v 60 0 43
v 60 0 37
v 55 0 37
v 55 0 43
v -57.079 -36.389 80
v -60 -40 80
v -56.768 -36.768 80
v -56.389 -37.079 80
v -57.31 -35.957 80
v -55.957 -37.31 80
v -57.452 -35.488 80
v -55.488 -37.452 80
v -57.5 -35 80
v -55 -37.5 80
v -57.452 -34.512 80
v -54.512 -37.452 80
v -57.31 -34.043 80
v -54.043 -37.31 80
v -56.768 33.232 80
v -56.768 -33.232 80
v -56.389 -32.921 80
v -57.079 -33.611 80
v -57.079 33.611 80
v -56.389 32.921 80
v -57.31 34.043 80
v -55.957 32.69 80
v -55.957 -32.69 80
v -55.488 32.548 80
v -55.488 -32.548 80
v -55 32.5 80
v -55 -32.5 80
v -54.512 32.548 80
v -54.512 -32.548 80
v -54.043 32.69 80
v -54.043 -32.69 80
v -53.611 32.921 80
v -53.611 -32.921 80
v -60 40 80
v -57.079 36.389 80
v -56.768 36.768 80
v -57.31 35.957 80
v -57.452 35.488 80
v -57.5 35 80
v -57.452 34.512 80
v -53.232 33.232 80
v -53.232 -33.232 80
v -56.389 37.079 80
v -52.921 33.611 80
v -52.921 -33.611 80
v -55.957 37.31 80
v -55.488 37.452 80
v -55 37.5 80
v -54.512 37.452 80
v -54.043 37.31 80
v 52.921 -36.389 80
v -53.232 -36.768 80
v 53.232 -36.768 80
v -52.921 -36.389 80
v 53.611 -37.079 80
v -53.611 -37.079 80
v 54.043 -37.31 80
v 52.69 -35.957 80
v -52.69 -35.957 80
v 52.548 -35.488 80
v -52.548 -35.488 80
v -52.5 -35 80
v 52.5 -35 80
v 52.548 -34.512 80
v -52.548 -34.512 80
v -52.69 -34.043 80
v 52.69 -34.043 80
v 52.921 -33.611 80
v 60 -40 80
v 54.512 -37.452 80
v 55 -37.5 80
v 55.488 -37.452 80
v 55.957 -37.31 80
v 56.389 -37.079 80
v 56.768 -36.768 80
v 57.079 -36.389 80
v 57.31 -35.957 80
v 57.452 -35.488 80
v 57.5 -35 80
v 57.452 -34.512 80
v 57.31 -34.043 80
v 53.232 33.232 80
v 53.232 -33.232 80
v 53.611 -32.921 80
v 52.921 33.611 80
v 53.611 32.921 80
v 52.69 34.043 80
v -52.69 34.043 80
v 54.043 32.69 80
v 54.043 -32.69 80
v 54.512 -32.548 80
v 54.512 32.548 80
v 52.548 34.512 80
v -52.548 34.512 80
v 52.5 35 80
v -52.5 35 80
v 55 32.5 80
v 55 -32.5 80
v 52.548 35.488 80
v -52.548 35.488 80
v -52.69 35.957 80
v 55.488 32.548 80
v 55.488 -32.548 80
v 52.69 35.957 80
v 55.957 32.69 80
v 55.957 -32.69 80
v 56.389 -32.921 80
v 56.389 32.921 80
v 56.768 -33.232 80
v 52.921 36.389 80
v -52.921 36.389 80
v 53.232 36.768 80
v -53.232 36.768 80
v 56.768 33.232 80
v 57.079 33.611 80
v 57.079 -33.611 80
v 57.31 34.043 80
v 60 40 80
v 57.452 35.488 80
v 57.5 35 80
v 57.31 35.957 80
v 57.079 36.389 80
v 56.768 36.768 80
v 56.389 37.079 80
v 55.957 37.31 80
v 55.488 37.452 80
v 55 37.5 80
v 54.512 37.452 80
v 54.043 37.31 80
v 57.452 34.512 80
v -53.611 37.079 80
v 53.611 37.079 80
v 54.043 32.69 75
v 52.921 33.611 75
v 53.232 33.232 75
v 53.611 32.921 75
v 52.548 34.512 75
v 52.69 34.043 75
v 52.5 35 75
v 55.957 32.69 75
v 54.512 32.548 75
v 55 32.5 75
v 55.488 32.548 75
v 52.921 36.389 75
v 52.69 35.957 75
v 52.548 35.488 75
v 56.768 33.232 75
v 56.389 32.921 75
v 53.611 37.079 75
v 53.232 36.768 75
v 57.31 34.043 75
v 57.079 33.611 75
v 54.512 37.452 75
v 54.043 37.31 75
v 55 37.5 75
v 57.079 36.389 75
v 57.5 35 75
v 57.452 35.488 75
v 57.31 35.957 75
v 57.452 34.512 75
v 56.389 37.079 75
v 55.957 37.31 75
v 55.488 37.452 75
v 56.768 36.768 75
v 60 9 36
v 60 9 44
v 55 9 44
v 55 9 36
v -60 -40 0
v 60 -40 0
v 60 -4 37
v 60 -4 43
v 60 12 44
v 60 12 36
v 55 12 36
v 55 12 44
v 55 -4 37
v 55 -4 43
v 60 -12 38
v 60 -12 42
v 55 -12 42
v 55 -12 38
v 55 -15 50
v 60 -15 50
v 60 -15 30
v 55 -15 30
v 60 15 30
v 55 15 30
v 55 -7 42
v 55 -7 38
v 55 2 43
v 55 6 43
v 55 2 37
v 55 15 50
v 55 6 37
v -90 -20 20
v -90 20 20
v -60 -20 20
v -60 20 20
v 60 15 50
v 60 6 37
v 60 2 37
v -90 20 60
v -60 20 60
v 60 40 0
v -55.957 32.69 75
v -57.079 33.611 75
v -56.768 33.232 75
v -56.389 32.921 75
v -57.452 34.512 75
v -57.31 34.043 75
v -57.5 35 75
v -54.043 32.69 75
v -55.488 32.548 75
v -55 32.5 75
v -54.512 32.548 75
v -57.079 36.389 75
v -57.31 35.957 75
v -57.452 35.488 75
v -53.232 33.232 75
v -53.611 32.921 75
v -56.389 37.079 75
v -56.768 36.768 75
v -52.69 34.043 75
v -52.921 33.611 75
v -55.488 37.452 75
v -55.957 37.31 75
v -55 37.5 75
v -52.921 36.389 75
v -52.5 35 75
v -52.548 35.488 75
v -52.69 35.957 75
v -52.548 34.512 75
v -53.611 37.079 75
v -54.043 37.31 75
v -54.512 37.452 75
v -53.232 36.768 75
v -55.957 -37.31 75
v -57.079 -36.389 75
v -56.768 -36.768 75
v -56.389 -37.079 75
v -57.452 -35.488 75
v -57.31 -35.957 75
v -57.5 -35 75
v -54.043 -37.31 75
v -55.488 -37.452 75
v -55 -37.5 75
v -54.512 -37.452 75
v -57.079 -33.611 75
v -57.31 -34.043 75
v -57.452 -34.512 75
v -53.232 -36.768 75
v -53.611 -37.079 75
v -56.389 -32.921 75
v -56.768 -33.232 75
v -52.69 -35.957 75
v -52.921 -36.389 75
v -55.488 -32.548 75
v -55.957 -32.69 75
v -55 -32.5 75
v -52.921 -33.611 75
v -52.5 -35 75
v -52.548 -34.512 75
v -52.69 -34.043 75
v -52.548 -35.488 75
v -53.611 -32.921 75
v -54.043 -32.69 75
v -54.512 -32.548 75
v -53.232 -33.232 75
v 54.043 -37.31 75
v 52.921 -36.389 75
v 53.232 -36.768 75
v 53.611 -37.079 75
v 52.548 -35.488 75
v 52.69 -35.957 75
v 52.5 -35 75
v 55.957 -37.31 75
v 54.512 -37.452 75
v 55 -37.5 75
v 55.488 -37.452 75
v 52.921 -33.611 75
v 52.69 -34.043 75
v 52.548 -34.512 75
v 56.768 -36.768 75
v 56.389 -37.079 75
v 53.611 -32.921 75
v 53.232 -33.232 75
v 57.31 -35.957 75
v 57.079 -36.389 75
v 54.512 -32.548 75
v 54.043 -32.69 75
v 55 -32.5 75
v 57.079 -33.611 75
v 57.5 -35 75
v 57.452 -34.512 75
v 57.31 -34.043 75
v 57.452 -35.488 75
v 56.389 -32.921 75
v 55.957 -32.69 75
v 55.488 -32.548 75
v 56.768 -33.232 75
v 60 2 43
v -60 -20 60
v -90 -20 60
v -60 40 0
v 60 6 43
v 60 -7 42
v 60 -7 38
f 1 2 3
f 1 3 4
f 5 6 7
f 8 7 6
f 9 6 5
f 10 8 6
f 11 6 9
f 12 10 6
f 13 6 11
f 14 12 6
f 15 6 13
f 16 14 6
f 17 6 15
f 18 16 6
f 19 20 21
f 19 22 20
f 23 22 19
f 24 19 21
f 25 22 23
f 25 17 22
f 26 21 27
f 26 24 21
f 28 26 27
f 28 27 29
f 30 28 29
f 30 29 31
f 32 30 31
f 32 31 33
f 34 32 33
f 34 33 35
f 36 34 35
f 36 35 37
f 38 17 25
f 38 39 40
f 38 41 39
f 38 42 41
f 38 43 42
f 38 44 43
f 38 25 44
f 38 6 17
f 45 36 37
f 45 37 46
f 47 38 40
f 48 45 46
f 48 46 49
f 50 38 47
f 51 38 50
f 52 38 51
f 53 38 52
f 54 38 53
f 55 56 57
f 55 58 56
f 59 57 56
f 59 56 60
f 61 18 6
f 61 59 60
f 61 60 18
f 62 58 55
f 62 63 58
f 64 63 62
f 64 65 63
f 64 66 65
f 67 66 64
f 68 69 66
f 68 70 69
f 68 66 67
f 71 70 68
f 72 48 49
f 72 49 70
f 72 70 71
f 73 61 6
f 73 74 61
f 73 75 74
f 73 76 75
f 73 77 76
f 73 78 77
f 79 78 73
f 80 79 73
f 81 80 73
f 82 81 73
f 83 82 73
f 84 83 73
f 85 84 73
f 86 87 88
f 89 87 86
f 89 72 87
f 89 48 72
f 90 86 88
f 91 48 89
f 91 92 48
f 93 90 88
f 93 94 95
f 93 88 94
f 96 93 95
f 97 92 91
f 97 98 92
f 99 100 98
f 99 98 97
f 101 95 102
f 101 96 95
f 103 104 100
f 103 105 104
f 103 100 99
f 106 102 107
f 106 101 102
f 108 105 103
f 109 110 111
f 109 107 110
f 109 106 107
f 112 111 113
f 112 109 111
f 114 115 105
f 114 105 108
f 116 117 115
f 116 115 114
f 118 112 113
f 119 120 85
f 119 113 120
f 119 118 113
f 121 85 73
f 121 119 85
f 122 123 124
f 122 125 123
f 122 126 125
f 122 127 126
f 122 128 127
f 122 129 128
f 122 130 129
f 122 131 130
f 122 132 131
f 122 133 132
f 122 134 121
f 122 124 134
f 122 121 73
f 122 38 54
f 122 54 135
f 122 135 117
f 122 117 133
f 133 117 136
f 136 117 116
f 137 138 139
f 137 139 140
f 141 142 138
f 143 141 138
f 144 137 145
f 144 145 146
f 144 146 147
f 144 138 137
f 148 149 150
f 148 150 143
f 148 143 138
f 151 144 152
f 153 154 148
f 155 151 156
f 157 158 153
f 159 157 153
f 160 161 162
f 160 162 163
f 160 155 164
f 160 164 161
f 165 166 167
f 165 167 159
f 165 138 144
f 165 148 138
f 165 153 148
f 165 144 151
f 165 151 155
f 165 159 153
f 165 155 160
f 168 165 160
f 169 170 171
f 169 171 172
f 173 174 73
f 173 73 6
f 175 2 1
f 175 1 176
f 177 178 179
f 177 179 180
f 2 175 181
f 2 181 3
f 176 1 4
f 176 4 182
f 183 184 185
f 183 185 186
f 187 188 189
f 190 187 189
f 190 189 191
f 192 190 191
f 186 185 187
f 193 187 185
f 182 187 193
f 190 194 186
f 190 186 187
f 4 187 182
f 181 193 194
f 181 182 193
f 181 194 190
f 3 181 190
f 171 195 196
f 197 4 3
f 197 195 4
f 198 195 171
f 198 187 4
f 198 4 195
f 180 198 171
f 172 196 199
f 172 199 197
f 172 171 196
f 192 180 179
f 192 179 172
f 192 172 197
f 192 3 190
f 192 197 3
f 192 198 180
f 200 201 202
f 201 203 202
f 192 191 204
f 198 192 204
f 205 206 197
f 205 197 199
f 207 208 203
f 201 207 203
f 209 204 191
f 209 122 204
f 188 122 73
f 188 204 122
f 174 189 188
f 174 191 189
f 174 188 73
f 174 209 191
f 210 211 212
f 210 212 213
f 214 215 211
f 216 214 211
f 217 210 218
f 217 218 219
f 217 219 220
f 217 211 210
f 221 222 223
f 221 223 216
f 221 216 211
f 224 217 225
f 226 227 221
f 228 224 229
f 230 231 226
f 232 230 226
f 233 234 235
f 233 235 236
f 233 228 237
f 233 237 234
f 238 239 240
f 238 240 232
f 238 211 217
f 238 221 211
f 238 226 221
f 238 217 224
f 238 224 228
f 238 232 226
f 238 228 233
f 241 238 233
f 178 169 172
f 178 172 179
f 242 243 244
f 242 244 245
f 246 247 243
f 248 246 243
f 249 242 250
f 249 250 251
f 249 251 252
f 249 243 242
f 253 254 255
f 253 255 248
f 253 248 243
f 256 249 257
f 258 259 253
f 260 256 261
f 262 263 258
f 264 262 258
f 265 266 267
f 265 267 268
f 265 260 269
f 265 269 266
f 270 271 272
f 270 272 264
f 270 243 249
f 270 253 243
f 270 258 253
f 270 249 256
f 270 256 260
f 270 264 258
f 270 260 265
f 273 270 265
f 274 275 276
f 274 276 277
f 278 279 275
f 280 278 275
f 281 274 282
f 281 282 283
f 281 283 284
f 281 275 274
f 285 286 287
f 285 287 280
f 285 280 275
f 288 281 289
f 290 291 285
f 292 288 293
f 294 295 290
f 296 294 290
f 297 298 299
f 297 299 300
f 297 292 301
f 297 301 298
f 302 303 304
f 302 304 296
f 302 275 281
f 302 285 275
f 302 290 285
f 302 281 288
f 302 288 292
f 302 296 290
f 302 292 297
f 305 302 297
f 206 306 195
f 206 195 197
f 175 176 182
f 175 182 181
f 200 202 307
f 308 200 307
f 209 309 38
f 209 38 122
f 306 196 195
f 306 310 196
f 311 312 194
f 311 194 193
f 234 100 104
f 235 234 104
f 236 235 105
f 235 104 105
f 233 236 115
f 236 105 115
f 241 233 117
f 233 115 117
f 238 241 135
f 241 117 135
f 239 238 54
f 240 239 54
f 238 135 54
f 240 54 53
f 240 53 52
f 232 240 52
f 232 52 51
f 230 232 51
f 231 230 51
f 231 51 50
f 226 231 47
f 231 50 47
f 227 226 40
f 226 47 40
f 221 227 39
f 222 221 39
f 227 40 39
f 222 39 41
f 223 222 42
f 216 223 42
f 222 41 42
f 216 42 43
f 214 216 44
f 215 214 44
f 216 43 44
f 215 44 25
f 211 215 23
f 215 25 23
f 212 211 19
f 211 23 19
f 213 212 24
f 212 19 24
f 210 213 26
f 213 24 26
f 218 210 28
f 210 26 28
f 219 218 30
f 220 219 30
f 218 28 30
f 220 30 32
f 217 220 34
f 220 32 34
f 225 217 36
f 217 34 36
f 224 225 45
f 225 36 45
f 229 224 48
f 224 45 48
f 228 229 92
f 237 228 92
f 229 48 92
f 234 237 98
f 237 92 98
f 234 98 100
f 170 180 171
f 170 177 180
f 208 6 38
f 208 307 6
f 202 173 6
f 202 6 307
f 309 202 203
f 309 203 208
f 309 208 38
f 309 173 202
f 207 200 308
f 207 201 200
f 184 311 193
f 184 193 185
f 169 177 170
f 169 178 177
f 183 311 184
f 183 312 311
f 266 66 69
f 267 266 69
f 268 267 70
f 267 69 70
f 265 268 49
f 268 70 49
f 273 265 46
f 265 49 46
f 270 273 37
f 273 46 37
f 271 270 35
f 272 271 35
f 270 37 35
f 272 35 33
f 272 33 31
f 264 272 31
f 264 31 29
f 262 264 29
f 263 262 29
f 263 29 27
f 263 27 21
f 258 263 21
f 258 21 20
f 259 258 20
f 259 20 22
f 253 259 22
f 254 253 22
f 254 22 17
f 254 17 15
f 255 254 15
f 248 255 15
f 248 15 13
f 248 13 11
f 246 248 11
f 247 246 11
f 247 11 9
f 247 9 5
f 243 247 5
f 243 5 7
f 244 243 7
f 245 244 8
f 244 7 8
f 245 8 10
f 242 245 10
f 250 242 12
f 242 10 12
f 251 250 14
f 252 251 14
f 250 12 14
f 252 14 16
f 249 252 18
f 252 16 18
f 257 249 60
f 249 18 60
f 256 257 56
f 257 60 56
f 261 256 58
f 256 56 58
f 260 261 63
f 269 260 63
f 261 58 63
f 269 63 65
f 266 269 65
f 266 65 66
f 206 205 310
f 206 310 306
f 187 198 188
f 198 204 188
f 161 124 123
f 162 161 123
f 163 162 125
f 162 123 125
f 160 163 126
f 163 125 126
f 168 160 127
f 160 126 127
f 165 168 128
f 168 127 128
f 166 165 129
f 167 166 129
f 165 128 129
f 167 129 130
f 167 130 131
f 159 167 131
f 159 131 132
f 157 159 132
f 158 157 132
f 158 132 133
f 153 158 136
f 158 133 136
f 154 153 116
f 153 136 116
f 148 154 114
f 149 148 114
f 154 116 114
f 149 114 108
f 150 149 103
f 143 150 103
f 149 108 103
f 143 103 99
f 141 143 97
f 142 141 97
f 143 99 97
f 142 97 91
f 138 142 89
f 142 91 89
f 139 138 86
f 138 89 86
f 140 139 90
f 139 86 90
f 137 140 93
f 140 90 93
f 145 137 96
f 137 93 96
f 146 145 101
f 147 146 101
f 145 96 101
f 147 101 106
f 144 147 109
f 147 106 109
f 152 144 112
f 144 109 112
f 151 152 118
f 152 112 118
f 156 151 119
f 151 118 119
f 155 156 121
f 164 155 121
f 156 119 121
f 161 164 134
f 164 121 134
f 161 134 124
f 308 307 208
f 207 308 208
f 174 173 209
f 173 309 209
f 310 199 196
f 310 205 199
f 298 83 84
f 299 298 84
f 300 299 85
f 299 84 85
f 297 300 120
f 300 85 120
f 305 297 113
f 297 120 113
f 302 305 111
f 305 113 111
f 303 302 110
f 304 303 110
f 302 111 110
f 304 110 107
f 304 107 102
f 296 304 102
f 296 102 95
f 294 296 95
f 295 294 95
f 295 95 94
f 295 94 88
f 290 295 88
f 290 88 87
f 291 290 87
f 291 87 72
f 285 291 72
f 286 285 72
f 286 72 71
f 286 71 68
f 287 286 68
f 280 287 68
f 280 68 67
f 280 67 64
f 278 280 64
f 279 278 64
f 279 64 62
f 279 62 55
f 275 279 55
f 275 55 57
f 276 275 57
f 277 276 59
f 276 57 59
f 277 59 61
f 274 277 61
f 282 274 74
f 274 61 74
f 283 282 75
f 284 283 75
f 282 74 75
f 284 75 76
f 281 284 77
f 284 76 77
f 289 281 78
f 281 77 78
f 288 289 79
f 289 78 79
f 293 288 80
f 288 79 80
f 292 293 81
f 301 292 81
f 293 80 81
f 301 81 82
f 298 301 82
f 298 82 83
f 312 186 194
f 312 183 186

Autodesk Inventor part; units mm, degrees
ref_plane "YZ Plane" through (0, 0, 0) normal (1, 0, 0) x (0, 1, 0)
ref_plane "XZ Plane" through (0, 0, 0) normal (0, 1, 0) x (-1, 0, 0)
ref_plane "XY Plane" through (0, 0, 0) normal (0, 0, 1) x (1, 0, 0)
sketch "Sketch1" plane through (0, 0, 0) normal (0, 0, 1) x (1, 0, 0)
  line L0 (-60, 40) -> (60, 40)
  line L1 (60, 40) -> (60, -40)
  line L2 (60, -40) -> (-60, -40)
  line L3 (-60, -40) -> (-60, 40)
  point P0 (0, 0)
  point P1 (0, 40)
  point P2 (-60, 0)
  dimension "d0" = 120
  dimension "d1" = 80
extrude "Extrusion1" add sketch "Sketch1" along normal blind 80
sketch "Sketch2" plane through (-60, -40, 0) normal (-1, 0, 0) x (0, 0, 1)
  line L0 (60, 60) -> (20, 60)
  line L1 (20, 60) -> (20, 20)
  line L2 (20, 20) -> (60, 20)
  line L3 (60, 20) -> (60, 60)
  line L4 (0, 0) -> (0, 80) projected
  line L5 (0, 80) -> (80, 80) projected
  point P0 (0, 40)
  point P1 (60, 40)
  point P2 (0, 40)
  point P3 (40, 60)
  point P4 (40, 80)
  dimension "d4" = 40
  dimension "d5" = 40
extrude "Extrusion2" add sketch "Sketch2" along normal blind 30
sketch "Sketch3" plane through (60, -40, 0) normal (1, 0, 0) x (0, 0, -1)
  line L0 (-50, 25) -> (-30, 25)
  line L1 (-30, 25) -> (-30, 55)
  line L2 (-30, 55) -> (-50, 55)
  line L3 (-50, 55) -> (-50, 25)
  line L4 (0, 0) -> (-80, 0)
  line L5 (-80, 0) -> (-80, 80)
  line L6 (-38, 33) -> (-42, 33)
  line L7 (-42, 33) -> (-42, 28)
  line L8 (-42, 28) -> (-38, 28)
  line L9 (-38, 28) -> (-38, 33)
  line L10 (-37, 40) -> (-43, 40)
  line L11 (-43, 40) -> (-43, 36)
  line L12 (-43, 36) -> (-37, 36)
  line L13 (-37, 36) -> (-37, 40)
  line L14 (-37, 46) -> (-43, 46)
  line L15 (-43, 46) -> (-43, 42)
  line L16 (-43, 42) -> (-37, 42)
  line L17 (-37, 42) -> (-37, 46)
  line L18 (-44, 49) -> (-36, 49)
  line L19 (-36, 49) -> (-36, 52)
  line L20 (-36, 52) -> (-44, 52)
  line L21 (-44, 52) -> (-44, 49)
  point P0 (0, 40)
  point P1 (-40, 25)
  point P2 (-40, 0)
  point P3 (-50, 40)
  point P4 (-80, 40)
  point P5 (-40, 28)
  point P6 (-40, 36)
  point P7 (-40, 42)
  point P8 (-40, 52)
  point P9 (-40, 55)
  dimension "d21" = 30
  dimension "d20" = 20
  dimension "d19" = 5
  dimension "d18" = 4
  dimension "d16" = 4
  dimension "d15" = 6
  dimension "d13" = 6
  dimension "d12" = 4
  dimension "d9" = 3
  dimension "d10" = 8
  dimension "d14" = 3
  dimension "d11" = 2
  dimension "d8" = 3
  dimension "d17" = 3
extrude "Extrusion3" cut sketch "Sketch3" against normal blind 5
sketch "Sketch4" plane through (0, 0, 80) normal (0, 0, 1) x (1, 0, 0)
  circle A0 centre (55, 35) radius 2.5
  line L0 (60, 40) -> (-60, 40) projected
  line L1 (60, -40) -> (60, 40) projected
  circle A1 centre (55, -35) radius 2.5
  circle A2 centre (-55, 35) radius 2.5
  circle A3 centre (-55, -35) radius 2.5
  point P0 (0, 0)
  dimension "d25" = 5
  dimension "d26" = 5
  dimension "d27" = 5
  dimension "d30" = 70
  dimension "d33" = 110
extrude "Extrusion4" cut sketch "Sketch4" against normal blind 5
properties part number "prismatic"
